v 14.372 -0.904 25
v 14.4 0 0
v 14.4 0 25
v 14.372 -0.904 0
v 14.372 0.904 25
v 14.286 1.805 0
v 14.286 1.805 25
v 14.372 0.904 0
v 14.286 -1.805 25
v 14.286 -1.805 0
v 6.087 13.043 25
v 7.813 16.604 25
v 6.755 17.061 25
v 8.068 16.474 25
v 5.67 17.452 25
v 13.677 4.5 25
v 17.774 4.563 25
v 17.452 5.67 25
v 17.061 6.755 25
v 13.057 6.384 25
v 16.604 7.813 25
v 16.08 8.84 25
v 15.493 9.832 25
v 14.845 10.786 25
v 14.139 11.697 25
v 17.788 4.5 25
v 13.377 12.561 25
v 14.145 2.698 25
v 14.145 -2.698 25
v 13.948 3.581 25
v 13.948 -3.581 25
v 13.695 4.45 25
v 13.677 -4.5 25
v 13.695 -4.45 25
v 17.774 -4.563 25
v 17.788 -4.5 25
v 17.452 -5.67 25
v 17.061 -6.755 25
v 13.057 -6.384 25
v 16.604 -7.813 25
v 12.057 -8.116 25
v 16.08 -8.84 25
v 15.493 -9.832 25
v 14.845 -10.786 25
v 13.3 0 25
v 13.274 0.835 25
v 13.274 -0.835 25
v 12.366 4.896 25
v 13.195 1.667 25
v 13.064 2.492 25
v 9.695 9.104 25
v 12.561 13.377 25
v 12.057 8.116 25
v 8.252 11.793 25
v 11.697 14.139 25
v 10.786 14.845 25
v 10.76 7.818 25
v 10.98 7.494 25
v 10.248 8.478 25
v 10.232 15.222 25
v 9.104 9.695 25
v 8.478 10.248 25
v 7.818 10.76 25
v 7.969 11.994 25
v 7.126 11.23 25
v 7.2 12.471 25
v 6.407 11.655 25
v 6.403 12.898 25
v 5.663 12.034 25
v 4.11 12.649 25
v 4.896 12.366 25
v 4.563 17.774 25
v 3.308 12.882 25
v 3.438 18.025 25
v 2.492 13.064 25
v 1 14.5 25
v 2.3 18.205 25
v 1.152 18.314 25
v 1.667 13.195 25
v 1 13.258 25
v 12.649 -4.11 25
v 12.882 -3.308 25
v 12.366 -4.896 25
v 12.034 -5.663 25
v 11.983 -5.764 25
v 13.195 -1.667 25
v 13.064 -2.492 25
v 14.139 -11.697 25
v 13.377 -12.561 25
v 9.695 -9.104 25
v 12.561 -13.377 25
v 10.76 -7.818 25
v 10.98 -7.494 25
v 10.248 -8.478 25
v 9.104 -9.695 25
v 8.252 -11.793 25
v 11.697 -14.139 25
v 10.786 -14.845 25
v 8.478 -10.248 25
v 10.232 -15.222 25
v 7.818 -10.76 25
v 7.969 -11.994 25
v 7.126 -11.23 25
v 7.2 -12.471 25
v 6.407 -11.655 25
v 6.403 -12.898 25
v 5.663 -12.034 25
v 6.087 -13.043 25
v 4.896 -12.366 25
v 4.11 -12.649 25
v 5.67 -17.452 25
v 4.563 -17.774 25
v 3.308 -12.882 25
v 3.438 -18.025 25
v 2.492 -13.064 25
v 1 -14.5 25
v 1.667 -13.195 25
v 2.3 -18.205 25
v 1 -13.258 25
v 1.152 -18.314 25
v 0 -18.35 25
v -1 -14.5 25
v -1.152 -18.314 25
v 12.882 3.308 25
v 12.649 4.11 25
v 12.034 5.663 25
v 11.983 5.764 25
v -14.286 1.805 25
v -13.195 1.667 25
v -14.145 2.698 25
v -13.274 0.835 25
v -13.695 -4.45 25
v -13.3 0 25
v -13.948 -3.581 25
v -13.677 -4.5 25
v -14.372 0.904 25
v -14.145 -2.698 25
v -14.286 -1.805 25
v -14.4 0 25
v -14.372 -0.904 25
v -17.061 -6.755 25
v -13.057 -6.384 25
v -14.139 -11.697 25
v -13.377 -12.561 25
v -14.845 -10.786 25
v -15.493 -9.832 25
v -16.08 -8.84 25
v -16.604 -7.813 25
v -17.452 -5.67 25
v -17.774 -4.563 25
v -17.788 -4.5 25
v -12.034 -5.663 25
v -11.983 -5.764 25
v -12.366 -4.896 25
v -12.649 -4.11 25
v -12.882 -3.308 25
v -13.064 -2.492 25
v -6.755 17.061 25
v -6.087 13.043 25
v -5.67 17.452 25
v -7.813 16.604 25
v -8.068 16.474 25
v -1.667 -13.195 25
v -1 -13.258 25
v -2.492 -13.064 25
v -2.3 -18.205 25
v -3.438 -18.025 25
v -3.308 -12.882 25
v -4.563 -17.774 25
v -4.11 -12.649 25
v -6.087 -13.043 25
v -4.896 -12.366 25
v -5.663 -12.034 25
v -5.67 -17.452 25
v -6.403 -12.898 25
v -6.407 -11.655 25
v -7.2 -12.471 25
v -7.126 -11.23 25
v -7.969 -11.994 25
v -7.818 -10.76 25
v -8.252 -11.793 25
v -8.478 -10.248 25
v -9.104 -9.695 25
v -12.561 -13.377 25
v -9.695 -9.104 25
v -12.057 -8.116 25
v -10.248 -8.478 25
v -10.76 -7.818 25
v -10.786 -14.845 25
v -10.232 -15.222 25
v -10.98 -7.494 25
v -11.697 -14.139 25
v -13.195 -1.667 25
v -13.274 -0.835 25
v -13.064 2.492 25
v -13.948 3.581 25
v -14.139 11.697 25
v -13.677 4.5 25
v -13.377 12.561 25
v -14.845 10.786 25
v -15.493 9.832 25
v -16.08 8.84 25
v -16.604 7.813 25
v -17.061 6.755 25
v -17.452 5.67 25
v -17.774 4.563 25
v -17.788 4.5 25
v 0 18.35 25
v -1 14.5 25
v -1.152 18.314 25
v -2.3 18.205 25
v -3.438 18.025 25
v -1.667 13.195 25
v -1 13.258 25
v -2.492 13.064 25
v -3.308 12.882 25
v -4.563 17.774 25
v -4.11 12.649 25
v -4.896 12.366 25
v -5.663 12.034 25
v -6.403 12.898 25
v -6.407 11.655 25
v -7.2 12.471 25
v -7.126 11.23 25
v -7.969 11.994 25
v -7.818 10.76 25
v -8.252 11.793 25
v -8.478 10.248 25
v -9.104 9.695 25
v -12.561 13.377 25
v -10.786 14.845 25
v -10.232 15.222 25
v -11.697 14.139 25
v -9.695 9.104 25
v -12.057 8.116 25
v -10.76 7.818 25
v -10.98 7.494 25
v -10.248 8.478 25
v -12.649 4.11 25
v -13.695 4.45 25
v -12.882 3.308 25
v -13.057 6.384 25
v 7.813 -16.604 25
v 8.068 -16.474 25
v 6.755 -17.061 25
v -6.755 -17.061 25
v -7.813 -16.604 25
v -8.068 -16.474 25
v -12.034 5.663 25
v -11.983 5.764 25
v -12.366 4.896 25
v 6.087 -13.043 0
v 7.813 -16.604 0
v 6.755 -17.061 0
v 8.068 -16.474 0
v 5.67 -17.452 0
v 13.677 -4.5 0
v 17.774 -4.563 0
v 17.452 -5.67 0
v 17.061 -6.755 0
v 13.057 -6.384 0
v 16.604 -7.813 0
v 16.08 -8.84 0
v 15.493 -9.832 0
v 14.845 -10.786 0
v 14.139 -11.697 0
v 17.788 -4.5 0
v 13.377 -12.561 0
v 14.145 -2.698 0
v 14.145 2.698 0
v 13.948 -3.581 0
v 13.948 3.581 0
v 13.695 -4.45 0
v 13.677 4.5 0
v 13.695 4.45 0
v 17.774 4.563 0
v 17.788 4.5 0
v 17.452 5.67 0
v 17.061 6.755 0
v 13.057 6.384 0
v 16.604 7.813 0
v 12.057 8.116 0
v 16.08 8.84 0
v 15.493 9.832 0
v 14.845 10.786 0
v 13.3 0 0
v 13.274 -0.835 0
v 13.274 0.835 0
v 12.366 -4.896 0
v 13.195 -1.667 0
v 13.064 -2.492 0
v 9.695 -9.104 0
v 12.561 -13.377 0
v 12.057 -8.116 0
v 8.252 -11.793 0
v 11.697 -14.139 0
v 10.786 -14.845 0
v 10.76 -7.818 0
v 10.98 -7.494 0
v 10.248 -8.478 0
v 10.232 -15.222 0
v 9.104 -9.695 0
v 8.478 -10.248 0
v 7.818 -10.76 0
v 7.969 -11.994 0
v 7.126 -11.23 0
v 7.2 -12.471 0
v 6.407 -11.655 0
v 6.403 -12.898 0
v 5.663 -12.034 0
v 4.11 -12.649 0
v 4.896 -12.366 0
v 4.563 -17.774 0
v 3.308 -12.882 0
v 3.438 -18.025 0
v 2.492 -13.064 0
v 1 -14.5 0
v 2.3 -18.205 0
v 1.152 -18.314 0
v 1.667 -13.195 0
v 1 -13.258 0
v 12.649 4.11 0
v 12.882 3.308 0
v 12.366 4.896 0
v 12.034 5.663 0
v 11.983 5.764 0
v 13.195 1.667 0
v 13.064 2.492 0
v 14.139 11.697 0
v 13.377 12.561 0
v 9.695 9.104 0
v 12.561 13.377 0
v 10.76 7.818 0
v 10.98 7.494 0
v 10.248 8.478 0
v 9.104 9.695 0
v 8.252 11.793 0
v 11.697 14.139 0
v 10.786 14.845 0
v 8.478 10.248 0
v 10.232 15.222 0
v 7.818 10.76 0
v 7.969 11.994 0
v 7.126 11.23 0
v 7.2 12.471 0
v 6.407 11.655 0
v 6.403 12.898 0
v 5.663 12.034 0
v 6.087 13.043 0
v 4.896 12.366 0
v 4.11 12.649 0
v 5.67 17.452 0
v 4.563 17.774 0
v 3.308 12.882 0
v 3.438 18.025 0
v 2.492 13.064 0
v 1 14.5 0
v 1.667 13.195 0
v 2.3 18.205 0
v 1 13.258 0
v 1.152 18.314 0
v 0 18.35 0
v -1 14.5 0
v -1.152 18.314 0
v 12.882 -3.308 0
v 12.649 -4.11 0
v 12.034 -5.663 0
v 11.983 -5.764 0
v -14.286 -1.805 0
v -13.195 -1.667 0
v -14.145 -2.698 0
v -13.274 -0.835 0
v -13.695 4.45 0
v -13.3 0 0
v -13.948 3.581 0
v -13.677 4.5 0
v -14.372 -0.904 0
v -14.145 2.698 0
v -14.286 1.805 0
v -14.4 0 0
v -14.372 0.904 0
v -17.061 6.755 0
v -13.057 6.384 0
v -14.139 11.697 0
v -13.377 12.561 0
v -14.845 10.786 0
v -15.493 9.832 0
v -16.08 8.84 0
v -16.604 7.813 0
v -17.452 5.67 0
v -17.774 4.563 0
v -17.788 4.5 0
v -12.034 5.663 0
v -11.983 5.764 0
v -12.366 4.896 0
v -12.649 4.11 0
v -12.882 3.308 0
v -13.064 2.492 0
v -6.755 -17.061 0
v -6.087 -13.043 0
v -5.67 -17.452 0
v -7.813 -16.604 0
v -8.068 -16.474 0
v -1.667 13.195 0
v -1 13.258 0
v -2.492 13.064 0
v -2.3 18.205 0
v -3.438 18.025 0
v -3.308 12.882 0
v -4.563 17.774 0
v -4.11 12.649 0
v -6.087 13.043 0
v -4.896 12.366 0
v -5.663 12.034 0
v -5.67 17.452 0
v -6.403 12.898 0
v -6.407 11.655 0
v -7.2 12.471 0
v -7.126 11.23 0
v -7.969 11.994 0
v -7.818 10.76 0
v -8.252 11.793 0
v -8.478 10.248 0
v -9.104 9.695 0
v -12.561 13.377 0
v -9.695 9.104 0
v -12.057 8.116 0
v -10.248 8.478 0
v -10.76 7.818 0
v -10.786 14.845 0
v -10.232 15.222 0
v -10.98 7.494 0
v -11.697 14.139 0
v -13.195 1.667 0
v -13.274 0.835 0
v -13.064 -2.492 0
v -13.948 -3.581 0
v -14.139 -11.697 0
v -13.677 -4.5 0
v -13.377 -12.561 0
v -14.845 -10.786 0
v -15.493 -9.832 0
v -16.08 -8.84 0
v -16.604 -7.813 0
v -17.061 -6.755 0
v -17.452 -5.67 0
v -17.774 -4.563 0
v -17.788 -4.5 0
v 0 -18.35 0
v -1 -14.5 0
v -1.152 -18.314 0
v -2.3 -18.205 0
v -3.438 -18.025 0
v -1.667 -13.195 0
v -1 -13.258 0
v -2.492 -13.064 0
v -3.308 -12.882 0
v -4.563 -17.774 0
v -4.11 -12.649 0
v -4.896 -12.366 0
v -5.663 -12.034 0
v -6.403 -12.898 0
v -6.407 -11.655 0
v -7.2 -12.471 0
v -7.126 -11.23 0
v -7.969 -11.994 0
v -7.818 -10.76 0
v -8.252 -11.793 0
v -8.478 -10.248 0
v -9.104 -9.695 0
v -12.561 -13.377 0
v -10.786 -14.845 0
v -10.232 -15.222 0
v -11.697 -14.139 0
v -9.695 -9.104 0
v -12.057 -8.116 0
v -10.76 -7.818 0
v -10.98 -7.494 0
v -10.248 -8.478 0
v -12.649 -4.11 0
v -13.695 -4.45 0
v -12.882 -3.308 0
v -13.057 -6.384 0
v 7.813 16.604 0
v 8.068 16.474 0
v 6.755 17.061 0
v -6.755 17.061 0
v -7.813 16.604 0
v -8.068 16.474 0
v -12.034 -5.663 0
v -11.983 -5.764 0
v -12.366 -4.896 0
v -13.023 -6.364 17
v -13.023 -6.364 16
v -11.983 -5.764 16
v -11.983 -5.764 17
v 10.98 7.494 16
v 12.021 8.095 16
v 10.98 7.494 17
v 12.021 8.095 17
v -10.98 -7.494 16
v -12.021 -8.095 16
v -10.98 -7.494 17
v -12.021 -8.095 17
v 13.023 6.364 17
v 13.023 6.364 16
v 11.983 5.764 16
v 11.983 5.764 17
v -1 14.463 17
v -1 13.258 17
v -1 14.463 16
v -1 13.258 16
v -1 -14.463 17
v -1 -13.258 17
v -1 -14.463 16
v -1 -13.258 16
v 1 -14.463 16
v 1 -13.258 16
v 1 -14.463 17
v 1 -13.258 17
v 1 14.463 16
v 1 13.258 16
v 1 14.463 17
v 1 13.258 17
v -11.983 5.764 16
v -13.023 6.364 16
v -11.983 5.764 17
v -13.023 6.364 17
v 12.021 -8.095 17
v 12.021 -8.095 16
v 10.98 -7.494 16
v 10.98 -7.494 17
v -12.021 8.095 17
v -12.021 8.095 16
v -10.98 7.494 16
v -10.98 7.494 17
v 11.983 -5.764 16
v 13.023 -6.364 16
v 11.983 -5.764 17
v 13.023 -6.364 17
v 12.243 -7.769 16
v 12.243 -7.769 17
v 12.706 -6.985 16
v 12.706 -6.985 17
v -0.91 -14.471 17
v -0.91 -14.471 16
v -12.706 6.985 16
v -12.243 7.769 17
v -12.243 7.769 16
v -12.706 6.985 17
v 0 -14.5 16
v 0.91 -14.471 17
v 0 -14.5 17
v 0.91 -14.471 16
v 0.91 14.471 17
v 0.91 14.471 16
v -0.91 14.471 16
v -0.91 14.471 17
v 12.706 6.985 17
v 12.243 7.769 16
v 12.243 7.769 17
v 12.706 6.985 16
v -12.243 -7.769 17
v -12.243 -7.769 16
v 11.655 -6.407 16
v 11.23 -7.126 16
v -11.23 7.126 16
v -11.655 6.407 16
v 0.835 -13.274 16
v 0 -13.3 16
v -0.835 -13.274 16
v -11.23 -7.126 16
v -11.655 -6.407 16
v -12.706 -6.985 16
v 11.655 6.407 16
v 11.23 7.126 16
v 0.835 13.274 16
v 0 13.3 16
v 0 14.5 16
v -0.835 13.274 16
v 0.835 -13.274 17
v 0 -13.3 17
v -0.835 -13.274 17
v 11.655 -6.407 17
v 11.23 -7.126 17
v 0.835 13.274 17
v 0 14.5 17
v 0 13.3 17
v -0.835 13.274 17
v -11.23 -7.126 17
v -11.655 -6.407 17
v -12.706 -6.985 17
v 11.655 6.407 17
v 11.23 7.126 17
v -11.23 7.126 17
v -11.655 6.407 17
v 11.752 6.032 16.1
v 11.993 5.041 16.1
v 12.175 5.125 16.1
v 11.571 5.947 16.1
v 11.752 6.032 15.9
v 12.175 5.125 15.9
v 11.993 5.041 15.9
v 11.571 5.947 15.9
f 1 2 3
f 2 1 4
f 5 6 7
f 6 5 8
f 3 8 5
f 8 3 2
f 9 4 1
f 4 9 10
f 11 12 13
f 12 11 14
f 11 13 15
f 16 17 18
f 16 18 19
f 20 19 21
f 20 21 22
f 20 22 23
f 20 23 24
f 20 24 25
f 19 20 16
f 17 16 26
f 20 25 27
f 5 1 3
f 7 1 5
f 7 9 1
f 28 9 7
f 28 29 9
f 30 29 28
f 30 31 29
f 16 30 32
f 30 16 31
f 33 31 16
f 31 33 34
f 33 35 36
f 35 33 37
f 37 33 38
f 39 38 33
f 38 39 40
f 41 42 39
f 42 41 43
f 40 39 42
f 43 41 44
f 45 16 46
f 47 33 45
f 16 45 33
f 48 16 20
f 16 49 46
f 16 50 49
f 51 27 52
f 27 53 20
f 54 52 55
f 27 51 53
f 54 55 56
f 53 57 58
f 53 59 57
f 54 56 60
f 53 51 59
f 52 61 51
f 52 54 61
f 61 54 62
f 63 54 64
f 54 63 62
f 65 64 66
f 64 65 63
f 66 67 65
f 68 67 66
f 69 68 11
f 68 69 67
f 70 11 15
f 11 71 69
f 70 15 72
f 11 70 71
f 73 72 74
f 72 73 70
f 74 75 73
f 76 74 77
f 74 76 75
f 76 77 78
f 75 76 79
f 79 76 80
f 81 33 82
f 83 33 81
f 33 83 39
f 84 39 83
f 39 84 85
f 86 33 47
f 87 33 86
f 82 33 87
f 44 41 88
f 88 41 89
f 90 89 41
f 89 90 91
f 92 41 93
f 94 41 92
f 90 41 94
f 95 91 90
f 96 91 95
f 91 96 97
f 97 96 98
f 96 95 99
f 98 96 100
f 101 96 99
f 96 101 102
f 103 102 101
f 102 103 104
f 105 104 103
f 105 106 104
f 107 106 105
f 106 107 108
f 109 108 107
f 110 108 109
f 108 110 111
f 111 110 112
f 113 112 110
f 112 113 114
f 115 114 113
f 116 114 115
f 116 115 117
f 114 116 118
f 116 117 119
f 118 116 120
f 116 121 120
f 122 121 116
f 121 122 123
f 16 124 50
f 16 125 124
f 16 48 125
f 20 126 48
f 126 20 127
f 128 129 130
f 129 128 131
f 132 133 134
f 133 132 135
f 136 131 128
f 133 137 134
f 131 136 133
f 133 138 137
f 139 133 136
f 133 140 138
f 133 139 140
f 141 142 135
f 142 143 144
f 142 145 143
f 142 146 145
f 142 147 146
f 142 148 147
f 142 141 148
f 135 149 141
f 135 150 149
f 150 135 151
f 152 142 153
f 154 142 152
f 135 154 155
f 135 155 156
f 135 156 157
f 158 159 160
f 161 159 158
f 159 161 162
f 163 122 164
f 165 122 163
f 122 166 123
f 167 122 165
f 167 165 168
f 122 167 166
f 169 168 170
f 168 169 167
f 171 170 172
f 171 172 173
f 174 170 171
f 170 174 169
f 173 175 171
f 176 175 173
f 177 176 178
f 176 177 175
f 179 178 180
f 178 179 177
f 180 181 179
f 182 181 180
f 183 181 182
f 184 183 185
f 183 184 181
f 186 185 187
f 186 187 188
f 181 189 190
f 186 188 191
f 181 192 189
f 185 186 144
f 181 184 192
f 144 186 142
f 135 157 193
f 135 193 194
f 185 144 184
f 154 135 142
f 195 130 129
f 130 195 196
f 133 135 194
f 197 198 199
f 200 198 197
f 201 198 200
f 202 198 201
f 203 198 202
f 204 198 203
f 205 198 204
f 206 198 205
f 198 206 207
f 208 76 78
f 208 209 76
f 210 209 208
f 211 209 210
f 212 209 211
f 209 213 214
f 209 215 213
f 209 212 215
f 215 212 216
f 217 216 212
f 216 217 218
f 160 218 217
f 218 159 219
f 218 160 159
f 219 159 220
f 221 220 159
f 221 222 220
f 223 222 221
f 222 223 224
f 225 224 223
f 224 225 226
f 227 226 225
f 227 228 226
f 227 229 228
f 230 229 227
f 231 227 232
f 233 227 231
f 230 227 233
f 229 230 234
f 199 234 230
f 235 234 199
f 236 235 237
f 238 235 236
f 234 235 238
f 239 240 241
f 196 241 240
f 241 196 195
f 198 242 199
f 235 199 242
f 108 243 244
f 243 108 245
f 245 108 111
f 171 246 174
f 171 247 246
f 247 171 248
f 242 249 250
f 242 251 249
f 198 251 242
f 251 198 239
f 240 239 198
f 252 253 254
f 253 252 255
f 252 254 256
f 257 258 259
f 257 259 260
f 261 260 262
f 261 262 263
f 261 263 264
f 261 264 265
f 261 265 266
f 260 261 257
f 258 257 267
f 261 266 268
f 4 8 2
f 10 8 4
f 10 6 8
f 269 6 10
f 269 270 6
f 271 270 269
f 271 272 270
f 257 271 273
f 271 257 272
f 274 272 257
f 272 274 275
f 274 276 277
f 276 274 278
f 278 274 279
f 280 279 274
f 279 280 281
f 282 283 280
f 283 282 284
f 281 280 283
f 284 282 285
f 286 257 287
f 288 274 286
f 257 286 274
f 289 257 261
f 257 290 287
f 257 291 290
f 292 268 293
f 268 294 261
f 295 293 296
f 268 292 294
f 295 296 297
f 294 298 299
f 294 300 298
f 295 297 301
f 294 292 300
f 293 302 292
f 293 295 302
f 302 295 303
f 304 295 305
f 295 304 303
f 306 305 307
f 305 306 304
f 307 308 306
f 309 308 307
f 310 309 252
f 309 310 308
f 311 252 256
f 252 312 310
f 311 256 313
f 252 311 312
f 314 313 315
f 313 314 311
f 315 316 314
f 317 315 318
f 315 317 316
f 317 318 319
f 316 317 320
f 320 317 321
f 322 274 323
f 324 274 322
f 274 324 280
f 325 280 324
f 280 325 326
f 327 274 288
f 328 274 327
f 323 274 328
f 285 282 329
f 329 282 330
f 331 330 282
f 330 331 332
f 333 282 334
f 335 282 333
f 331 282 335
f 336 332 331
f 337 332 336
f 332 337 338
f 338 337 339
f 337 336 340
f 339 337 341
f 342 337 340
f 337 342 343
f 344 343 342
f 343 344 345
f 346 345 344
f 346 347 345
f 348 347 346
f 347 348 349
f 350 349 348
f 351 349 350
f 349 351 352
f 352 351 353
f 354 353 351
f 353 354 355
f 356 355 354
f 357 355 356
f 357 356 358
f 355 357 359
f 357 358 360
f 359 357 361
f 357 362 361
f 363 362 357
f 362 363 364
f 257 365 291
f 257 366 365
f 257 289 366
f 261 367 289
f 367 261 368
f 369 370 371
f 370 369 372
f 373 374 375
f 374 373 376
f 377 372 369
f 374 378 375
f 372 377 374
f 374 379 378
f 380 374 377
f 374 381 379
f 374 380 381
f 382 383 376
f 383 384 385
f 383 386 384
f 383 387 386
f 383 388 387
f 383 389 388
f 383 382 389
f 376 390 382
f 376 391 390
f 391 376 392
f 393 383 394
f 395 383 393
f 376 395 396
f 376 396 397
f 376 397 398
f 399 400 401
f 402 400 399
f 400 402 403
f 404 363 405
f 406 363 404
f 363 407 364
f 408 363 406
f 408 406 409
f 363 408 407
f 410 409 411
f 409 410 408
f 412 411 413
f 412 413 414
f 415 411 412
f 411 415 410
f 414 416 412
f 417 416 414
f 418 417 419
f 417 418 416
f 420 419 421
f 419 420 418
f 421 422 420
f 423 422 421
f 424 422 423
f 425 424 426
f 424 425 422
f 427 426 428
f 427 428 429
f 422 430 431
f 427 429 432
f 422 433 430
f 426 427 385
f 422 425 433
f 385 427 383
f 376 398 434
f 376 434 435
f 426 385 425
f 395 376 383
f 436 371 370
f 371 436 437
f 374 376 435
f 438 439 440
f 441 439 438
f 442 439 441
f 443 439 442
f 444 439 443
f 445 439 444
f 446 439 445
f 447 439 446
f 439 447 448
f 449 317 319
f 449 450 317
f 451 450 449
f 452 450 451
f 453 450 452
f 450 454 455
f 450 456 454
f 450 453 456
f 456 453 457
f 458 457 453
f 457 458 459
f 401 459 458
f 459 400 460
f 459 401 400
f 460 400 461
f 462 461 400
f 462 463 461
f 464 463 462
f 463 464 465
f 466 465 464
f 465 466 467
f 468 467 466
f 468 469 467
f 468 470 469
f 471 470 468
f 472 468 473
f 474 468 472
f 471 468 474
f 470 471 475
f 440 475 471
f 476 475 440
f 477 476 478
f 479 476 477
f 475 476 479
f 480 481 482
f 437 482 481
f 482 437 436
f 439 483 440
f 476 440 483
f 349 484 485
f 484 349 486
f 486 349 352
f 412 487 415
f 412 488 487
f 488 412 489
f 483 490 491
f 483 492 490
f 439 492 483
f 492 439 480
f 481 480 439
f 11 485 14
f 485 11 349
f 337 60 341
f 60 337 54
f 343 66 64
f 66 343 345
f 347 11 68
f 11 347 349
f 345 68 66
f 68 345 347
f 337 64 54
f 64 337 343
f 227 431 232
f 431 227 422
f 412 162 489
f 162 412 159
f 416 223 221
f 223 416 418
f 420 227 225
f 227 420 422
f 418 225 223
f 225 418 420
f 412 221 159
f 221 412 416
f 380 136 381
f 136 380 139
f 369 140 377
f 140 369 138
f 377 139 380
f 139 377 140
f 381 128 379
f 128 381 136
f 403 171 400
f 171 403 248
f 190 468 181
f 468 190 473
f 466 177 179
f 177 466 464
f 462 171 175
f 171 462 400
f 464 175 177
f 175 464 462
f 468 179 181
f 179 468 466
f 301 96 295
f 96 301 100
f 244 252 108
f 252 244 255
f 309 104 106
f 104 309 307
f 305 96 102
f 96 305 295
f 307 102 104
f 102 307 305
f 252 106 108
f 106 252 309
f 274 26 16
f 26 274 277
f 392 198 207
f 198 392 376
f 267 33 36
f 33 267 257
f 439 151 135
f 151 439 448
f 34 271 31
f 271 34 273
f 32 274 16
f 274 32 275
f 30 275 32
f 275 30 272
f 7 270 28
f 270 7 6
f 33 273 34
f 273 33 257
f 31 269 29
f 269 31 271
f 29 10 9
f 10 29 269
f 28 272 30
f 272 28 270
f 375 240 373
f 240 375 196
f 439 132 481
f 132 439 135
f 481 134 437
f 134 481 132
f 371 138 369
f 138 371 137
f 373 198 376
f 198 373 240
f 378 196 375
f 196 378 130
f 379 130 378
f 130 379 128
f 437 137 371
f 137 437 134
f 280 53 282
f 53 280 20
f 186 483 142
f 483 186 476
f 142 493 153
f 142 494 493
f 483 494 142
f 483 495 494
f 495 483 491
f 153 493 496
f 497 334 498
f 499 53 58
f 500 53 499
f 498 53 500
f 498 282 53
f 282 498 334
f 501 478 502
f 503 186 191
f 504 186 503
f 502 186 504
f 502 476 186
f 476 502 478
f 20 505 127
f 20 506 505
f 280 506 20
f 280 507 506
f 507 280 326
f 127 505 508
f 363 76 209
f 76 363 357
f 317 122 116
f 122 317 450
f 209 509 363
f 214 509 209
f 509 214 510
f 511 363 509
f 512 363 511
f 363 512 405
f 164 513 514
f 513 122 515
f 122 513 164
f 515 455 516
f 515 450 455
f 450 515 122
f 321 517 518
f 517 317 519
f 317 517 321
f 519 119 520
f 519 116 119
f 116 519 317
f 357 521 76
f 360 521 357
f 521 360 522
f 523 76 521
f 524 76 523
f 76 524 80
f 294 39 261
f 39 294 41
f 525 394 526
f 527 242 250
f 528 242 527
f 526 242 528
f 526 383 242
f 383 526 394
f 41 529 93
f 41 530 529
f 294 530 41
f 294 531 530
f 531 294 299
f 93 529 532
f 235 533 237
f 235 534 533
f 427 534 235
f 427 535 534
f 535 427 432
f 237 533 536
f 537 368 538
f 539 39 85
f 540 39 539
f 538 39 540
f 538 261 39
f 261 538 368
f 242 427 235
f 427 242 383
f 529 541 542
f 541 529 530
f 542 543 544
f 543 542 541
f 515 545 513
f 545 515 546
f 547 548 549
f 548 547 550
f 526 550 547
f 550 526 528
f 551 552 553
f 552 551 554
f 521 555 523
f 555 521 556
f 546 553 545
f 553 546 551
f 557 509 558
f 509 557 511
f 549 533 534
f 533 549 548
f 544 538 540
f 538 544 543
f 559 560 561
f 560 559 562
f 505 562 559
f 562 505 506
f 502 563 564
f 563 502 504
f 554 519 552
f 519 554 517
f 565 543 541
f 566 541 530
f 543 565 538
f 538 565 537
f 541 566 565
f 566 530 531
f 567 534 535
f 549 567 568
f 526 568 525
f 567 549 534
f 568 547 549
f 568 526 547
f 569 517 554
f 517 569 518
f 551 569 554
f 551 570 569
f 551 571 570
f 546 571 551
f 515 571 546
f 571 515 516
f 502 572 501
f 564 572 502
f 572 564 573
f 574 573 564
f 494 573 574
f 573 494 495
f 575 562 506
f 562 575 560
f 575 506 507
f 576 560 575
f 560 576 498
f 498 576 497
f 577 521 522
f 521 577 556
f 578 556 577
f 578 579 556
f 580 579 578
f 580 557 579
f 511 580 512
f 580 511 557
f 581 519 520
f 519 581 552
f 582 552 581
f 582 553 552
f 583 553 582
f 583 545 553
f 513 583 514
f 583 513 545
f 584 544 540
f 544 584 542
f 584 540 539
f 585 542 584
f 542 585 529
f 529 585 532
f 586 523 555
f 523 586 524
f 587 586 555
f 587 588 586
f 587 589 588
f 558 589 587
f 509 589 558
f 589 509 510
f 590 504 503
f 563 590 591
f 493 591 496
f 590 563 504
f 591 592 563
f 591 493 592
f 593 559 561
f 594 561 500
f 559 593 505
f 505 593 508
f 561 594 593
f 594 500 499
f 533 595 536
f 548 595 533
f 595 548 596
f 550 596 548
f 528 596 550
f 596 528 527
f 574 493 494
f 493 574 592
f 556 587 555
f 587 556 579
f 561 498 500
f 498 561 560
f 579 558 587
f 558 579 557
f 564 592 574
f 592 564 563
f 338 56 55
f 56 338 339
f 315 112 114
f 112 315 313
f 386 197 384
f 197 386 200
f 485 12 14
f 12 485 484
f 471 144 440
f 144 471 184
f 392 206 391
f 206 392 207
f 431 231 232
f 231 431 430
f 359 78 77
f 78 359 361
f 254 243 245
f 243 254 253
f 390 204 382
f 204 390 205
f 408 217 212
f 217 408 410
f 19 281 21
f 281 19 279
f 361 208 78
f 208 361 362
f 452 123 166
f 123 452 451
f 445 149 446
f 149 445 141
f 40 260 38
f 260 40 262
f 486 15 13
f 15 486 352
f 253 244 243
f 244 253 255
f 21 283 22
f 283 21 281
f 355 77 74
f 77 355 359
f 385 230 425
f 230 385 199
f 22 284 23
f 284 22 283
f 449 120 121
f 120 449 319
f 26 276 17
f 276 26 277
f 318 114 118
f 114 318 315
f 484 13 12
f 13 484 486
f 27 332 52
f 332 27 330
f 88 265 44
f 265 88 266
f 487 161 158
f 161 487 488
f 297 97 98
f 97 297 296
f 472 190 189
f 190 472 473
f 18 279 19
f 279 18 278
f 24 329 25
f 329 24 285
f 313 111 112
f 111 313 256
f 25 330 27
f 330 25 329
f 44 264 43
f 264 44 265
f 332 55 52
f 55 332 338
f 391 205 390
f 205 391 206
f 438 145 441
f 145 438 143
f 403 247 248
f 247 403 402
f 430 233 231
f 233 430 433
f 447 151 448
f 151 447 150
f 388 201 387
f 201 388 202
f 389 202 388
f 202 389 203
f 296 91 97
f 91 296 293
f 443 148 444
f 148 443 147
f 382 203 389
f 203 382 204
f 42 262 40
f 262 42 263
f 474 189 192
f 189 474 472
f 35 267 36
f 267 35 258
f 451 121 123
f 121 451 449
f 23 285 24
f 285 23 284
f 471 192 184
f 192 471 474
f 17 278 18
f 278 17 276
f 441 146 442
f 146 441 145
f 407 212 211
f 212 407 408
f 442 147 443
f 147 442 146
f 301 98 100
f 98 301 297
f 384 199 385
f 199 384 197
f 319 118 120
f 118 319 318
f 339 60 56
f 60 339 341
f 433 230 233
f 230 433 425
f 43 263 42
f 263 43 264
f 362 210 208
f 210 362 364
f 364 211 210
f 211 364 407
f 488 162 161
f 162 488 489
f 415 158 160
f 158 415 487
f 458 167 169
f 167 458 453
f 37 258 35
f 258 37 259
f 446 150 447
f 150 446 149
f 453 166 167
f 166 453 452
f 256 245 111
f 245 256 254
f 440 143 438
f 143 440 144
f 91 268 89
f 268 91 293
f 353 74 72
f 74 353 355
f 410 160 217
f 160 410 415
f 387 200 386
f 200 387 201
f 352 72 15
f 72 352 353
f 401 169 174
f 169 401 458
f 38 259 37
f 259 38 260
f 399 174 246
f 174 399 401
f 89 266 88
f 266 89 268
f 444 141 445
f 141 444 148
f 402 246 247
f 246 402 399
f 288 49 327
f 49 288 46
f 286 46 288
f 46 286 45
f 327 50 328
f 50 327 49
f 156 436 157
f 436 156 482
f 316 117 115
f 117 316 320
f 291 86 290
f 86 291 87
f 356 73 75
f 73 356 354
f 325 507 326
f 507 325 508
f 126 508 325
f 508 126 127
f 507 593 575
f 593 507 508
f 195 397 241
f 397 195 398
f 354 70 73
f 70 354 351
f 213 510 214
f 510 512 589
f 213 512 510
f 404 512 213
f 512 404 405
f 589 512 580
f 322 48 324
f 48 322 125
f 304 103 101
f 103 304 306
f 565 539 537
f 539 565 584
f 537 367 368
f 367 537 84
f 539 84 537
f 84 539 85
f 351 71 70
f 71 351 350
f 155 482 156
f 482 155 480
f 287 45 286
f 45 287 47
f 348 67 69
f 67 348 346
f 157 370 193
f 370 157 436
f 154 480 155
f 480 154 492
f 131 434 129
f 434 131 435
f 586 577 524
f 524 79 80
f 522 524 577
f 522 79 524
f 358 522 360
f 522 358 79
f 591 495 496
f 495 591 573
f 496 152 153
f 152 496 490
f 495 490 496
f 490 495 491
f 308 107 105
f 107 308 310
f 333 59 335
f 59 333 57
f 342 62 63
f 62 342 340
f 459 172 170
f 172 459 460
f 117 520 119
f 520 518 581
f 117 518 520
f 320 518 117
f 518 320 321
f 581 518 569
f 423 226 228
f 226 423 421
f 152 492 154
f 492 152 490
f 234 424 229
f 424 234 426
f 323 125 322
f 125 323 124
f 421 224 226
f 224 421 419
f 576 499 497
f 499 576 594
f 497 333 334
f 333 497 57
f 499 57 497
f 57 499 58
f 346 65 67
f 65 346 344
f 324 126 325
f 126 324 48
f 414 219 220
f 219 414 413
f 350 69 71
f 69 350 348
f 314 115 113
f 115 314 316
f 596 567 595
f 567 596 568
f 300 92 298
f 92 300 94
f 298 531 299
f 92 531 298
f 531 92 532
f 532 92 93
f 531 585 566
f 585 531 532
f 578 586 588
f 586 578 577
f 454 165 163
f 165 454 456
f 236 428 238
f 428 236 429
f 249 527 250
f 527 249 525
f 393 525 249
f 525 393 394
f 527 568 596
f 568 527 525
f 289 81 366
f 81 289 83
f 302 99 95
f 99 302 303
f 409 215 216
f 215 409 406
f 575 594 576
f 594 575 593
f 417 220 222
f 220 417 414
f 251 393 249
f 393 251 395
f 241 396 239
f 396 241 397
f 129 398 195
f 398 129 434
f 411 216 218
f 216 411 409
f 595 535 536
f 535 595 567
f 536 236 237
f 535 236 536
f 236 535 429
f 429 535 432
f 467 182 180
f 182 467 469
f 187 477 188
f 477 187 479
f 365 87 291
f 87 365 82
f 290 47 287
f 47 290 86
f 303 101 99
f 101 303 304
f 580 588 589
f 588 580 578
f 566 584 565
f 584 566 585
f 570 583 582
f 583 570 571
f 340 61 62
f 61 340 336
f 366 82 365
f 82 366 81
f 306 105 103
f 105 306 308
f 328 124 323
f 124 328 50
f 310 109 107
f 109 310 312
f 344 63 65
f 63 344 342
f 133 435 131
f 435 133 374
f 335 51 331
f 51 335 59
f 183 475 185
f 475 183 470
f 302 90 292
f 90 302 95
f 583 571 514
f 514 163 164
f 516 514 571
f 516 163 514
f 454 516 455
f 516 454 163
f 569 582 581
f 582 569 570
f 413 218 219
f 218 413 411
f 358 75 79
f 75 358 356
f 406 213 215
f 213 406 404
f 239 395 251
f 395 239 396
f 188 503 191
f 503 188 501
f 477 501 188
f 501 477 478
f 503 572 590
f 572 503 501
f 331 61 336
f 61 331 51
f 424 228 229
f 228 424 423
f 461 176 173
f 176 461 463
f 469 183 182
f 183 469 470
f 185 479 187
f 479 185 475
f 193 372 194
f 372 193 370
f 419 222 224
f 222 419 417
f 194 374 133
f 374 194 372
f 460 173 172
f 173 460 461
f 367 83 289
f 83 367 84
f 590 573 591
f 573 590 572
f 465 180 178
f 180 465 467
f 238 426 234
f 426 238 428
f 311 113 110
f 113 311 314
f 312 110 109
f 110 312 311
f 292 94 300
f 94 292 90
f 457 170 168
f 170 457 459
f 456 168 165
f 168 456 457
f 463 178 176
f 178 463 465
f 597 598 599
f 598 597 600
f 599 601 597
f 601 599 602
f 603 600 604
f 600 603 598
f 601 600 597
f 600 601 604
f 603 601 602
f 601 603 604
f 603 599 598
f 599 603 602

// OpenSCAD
$fn=100;

inner_dia = 26.6;
inner_fin_dia = 29;

height = 25;
fin_width = 2;
fin_count = 6;
blind_fin_dia = 28.8;
blind_fin_width = 2.5;
blind_big_fin_width = 9;
outer_dia = 36.7;

notch_depth = .2;
notch_width = 1;
notch_height = 16;

difference () {
    cylinder (h = height, d=outer_dia, center = false);
    // Remove the main inner cylinder
    cylinder (h = height*3, d=inner_dia, center = true);
    // Remove the blind fins
    for (a = [0: 360 / fin_count : 360-1]) {
        rotate (a) {
            difference() {
                translate([0, -blind_fin_width/ 2, -.1]) {
                    cube ([outer_dia, blind_fin_width, height+.2]);
                }
                cylinder (h = height, d=blind_fin_dia, center = false);
            }
        }
    }
        // Remove the blind big fins
    for (a = [0: 360 / 2: 360-1]) {
        rotate (a) {
            difference() {
                translate([0, -blind_big_fin_width/ 2, -.1]) {
                    cube ([outer_dia, blind_big_fin_width, height+.2]);
                }
                cylinder (h = height, d=blind_fin_dia, center = false);
            }
        }
    }

    // Remove the motor inner fins
    difference() {
        union() {
            for (a = [360 / fin_count/2: 360 / fin_count : 179]) {
                rotate (a) {
                    translate([-inner_fin_dia / 2, -fin_width / 2, -.1]) {
                        cube ([inner_fin_dia, fin_width, height+.2]);
                    }
                }
            }
        }
        // Put in an end stop to prevent motor pushing past insert
        translate([0, 0, notch_height]) cylinder(d=inner_fin_dia, h=1); 
    }
}



color("Blue"){
rotate(25) {translate([(inner_dia / 2)-notch_depth, 0, notch_height]) {
    cube([notch_depth, notch_width, notch_depth], center=true);
    }
}}
